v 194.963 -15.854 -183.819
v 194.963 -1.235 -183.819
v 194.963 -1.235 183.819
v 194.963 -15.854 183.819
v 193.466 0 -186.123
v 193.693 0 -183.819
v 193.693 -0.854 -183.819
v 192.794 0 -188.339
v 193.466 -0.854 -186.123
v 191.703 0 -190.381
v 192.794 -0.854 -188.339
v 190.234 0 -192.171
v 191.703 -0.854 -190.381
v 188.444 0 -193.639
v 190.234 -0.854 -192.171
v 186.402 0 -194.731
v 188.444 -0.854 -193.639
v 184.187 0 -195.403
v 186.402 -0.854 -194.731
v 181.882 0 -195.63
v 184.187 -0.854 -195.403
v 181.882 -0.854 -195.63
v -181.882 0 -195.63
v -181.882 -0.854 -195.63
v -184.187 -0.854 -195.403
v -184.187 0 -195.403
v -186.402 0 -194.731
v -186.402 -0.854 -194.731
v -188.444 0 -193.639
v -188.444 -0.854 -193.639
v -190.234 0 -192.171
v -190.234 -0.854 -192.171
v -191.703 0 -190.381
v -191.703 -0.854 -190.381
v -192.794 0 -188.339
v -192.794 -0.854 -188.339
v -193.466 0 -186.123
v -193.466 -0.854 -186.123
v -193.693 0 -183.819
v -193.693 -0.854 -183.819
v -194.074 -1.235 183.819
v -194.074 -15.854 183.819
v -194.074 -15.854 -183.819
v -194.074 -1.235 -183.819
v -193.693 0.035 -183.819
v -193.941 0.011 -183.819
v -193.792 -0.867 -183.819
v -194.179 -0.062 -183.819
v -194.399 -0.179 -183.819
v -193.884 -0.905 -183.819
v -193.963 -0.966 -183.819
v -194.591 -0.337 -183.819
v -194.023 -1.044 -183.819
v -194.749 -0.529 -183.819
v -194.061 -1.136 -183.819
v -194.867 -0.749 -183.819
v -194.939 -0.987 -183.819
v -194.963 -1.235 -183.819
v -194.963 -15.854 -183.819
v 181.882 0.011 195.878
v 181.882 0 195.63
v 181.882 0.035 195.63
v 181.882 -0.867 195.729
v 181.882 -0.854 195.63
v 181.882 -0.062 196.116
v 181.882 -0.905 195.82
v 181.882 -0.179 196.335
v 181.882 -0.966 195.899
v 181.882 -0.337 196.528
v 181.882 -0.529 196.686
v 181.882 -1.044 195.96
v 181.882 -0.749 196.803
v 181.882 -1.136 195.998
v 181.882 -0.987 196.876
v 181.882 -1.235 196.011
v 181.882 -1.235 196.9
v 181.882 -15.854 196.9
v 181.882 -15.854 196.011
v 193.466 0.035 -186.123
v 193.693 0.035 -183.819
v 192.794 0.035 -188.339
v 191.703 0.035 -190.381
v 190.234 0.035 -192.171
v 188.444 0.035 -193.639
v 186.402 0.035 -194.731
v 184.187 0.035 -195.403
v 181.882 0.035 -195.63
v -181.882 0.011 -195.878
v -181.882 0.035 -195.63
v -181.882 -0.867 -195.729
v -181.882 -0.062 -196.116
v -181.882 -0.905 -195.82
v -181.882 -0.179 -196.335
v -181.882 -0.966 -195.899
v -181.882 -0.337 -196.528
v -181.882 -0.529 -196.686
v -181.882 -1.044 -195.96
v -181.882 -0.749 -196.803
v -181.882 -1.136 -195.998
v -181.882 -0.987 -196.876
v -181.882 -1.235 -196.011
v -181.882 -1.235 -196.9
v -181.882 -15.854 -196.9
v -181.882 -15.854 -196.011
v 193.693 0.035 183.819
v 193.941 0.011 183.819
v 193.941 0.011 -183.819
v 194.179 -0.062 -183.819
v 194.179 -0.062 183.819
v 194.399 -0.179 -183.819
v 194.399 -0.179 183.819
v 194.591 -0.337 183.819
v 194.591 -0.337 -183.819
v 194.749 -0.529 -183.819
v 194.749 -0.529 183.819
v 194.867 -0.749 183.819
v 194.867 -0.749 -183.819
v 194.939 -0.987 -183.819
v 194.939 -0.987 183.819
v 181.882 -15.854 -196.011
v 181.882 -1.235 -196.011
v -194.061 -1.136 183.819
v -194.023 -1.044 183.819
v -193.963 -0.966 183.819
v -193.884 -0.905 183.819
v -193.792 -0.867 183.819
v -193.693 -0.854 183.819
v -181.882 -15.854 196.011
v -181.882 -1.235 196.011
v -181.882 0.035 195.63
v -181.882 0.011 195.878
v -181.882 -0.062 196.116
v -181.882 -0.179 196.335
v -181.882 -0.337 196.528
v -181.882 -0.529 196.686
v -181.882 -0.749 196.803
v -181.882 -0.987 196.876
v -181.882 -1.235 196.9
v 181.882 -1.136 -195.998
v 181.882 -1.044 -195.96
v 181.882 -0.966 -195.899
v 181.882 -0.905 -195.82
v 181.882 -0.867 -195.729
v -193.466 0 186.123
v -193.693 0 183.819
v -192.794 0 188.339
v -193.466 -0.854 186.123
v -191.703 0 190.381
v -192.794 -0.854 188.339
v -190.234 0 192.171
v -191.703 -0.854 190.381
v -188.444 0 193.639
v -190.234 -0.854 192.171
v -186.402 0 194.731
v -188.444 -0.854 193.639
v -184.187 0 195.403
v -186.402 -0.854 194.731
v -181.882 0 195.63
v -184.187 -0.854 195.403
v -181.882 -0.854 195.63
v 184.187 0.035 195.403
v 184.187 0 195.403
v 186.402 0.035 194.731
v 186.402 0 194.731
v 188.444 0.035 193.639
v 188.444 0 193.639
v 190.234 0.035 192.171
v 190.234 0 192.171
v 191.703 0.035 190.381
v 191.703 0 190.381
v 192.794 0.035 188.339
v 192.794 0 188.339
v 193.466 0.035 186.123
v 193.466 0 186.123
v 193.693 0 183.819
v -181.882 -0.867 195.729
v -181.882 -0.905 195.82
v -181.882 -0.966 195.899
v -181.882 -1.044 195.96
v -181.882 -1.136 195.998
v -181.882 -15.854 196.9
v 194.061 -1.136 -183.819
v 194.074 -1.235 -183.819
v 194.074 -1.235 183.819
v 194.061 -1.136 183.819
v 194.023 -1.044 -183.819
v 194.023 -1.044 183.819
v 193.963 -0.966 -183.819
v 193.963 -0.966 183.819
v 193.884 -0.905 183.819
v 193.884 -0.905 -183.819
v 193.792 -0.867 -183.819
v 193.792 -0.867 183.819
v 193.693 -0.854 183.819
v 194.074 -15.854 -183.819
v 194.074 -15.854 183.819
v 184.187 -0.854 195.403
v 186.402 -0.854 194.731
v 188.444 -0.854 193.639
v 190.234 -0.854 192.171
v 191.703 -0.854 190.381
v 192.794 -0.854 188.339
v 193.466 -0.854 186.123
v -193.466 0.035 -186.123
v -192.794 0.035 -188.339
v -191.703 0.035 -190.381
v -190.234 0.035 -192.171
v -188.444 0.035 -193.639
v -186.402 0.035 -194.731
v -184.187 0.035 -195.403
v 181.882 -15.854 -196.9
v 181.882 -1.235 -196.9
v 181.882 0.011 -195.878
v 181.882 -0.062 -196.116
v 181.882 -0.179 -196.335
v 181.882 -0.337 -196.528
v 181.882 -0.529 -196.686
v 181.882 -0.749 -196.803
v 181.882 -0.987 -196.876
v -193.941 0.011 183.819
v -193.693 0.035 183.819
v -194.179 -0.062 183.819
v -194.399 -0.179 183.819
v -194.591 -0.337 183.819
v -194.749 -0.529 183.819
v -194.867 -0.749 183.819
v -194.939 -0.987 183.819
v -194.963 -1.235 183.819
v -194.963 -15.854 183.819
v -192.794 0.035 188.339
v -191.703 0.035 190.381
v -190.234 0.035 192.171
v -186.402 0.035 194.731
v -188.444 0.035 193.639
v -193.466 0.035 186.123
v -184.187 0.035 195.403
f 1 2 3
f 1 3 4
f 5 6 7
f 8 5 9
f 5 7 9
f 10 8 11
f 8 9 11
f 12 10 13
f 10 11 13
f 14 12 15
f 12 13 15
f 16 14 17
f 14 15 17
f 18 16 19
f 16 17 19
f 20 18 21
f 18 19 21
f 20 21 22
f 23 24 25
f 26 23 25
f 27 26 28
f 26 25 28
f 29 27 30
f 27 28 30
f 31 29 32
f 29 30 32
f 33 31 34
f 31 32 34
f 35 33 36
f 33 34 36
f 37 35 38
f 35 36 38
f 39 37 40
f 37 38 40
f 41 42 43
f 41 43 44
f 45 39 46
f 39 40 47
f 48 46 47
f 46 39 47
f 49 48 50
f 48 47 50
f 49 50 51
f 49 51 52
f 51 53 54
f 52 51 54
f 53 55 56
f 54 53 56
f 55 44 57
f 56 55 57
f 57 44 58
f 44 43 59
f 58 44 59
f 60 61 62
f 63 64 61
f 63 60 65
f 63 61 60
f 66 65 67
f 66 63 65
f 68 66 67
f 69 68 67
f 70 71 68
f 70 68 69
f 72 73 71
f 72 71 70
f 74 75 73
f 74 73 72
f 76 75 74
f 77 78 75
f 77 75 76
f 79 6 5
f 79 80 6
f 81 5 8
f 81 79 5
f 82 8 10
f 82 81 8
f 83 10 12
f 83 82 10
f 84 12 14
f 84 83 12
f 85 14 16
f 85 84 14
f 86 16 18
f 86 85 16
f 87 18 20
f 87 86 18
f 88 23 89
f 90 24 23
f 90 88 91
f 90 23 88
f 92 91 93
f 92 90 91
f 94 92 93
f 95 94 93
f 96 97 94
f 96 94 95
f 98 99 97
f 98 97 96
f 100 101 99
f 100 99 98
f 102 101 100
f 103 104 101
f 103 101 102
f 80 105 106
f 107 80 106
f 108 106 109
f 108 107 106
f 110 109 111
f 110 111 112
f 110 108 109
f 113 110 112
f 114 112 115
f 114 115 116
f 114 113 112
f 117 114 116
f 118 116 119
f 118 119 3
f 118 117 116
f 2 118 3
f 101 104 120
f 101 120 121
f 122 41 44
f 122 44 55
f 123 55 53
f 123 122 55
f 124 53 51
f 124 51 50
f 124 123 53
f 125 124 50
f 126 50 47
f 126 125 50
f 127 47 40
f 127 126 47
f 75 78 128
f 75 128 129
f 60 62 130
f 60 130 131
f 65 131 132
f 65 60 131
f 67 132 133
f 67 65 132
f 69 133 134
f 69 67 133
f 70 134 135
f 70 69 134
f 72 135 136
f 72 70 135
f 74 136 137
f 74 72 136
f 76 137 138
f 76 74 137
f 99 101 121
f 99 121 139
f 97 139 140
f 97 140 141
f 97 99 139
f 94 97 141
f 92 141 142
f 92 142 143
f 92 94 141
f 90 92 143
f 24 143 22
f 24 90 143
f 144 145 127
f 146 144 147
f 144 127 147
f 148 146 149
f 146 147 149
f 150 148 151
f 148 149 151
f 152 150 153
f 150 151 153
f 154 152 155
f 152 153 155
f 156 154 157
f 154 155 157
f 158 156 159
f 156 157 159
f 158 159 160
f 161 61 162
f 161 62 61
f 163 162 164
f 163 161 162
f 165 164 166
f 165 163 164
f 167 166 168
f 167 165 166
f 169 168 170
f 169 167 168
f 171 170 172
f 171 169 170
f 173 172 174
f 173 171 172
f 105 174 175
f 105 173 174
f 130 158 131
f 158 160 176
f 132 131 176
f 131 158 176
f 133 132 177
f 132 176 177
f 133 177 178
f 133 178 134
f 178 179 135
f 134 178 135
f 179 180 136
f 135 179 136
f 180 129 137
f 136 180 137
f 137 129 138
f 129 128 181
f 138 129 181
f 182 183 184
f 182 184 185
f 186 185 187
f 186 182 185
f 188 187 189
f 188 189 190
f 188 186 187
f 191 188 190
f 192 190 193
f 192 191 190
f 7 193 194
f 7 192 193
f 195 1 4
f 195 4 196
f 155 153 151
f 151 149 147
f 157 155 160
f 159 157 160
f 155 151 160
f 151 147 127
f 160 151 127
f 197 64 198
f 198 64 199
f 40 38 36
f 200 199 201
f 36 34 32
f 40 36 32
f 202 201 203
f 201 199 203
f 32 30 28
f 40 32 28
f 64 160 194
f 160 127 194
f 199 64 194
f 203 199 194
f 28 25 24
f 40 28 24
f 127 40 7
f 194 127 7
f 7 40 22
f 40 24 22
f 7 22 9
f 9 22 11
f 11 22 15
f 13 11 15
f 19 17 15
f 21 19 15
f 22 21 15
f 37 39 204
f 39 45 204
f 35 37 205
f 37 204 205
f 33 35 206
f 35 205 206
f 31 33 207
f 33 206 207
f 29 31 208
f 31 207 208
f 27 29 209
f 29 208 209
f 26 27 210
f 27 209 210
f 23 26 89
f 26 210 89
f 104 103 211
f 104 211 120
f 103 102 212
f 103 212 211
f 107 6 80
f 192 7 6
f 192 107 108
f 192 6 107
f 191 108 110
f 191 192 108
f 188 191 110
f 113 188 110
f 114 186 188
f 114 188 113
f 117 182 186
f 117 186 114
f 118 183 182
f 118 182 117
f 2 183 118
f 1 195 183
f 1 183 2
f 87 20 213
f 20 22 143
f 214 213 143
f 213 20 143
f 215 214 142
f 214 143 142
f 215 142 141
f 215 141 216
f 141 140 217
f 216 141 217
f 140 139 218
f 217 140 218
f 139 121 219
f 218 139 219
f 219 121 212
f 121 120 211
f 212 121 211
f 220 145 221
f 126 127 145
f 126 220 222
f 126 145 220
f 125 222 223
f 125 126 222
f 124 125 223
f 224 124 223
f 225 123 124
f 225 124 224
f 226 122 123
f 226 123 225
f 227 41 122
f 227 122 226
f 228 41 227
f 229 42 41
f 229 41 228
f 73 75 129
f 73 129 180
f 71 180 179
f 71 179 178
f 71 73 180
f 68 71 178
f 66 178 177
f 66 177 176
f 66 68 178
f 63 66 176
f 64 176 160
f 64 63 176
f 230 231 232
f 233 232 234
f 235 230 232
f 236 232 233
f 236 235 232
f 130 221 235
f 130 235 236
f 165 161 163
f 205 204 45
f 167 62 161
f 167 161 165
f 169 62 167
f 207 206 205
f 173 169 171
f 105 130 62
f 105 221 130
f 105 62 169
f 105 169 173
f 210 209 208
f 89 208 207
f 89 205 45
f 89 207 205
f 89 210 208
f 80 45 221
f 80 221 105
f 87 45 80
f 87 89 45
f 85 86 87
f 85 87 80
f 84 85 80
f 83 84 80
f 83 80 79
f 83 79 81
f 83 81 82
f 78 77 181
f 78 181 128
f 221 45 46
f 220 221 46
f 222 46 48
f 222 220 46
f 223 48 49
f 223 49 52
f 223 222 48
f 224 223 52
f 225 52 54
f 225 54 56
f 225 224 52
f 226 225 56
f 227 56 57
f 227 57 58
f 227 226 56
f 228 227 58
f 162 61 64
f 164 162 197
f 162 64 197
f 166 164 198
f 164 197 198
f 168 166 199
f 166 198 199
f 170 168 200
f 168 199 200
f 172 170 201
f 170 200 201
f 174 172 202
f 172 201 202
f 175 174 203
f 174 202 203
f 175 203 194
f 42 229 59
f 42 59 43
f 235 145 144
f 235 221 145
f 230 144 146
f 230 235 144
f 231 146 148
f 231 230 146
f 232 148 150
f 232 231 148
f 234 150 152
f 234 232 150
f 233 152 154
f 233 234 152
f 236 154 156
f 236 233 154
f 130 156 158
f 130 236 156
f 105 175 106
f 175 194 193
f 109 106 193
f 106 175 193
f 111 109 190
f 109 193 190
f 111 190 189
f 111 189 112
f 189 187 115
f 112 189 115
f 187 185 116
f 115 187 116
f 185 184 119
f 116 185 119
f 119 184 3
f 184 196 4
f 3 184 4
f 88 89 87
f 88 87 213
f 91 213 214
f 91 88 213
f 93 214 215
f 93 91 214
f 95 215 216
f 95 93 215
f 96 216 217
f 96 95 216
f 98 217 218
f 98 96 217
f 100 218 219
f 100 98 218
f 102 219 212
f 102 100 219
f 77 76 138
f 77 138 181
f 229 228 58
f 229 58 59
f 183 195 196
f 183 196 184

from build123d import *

# Parameters (mm, degrees)
SKETCH1_W                 = 387.38683
SKETCH1_H                 = 391.2598474
BOSS_EXTRUDE1_DEPTH       = 0.035
FILLET1_R                 = 11.811
CONVERT_SOLID1_START      = -0.854
CONVERT_SOLID1_DEPTH      = 0.854
EDGE_FLANGE1_DEPTH        = 367.6378474
EDGE_FLANGE1_BEND_DEPTH   = 363.76483
EDGE_FLANGE1_BEND_2_DEPTH = 367.6378474
EDGE_FLANGE1_BEND_3_DEPTH = 363.76483


# Read off the part's stored shape, not the designer's step: Convert-Solid1
# Sheet-metal steps are written as plain solids
with BuildPart() as part:
    # Sketch1 → Boss-Extrude1 (new body)
    with BuildSketch(Plane(origin=(0, 0, 0), x_dir=(1, 0, 0), z_dir=(0, 1, 0))):
        Rectangle(SKETCH1_W, SKETCH1_H)
    extrude(amount=BOSS_EXTRUDE1_DEPTH)

    # Fillet1
    fillet1_edges = [part.edges().sort_by_distance(p)[0] for p in [
        (193.693415, 0.0175, -195.6299237),
        (193.693415, 0.0175, 195.6299237),
        (-193.693415, 0.0175, 195.6299237),
        (-193.693415, 0.0175, -195.6299237),
    ]]
    fillet(fillet1_edges, radius=FILLET1_R)

    # Convert-Solid1 outline → Convert-Solid1 (add)
    with BuildSketch(Plane(origin=(0, 0, 0), x_dir=(1, 0, 0), z_dir=(0, 1, 0)).offset(CONVERT_SOLID1_START)):
        with BuildLine():
            ThreePointArc((193.693415, 183.8189237), (190.234053193, 192.170561893), (181.882415, 195.6299237))
            Line((181.882415, 195.6299237), (-181.882415, 195.6299237))
            ThreePointArc((-181.882415, 195.6299237), (-190.234053193, 192.170561893), (-193.693415, 183.8189237))
            Line((-193.693415, 183.8189237), (-193.693415, -183.8189237))
            ThreePointArc((-193.693415, -183.8189237), (-190.234053193, -192.170561893), (-181.882415, -195.6299237))
            Line((-181.882415, -195.6299237), (181.882415, -195.6299237))
            ThreePointArc((181.882415, -195.6299237), (190.234053193, -192.170561893), (193.693415, -183.8189237))
            Line((193.693415, -183.8189237), (193.693415, 183.8189237))
        make_face()
    extrude(amount=CONVERT_SOLID1_DEPTH)

    # Edge-Flange1 section (across the edge) → Edge-Flange1 (add)
    with BuildSketch(Plane(origin=(-194.074415, -0.854, 183.8189237), x_dir=(1, 0, 0), z_dir=(0, 0, -1))):
        with BuildLine():
            Line((-0.889, 0.381), (-0.889, 15))
            Line((-0.889, 15), (0, 15))
            Line((0, 15), (0, 0.381))
            ThreePointArc((0, 0.381), (0.111592316, 0.111592316), (0.381, 0))
            Line((0.381, 0), (0.381, -0.889))
            ThreePointArc((0.381, -0.889), (-0.517025612, -0.517025612), (-0.889, 0.381))
        make_face()
    extrude(amount=EDGE_FLANGE1_DEPTH)

    # Edge-Flange1 section 2 (across the edge) → Edge-Flange1 bend (add)
    with BuildSketch(Plane(origin=(181.882415, -0.854, 196.0109237), x_dir=(0, 0, -1), z_dir=(-1, 0, 0))):
        with BuildLine():
            Line((-0.889, 0.381), (-0.889, 15))
            Line((-0.889, 15), (0, 15))
            Line((0, 15), (0, 0.381))
            ThreePointArc((0, 0.381), (0.111592316, 0.111592316), (0.381, 0))
            Line((0.381, 0), (0.381, -0.889))
            ThreePointArc((0.381, -0.889), (-0.517025612, -0.517025612), (-0.889, 0.381))
        make_face()
    extrude(amount=EDGE_FLANGE1_BEND_DEPTH)

    # Edge-Flange1 section 3 (across the edge) → Edge-Flange1 bend 2 (add)
    with BuildSketch(Plane(origin=(194.074415, -0.854, -183.8189237), x_dir=(-1, 0, 0), z_dir=(0, 0, 1))):
        with BuildLine():
            Line((-0.889, 0.381), (-0.889, 15))
            Line((-0.889, 15), (0, 15))
            Line((0, 15), (0, 0.381))
            ThreePointArc((0, 0.381), (0.111592316, 0.111592316), (0.381, 0))
            Line((0.381, 0), (0.381, -0.889))
            ThreePointArc((0.381, -0.889), (-0.517025612, -0.517025612), (-0.889, 0.381))
        make_face()
    extrude(amount=EDGE_FLANGE1_BEND_2_DEPTH)

    # Edge-Flange1 section 4 (across the edge) → Edge-Flange1 bend 3 (add)
    with BuildSketch(Plane(origin=(-181.882415, -0.854, -196.0109237), x_dir=(0, 0, 1), z_dir=(1, 0, 0))):
        with BuildLine():
            Line((-0.889, 0.381), (-0.889, 15))
            Line((-0.889, 15), (0, 15))
            Line((0, 15), (0, 0.381))
            ThreePointArc((0, 0.381), (0.111592316, 0.111592316), (0.381, 0))
            Line((0.381, 0), (0.381, -0.889))
            ThreePointArc((0.381, -0.889), (-0.517025612, -0.517025612), (-0.889, 0.381))
        make_face()
    extrude(amount=EDGE_FLANGE1_BEND_3_DEPTH)


solid = part.part
